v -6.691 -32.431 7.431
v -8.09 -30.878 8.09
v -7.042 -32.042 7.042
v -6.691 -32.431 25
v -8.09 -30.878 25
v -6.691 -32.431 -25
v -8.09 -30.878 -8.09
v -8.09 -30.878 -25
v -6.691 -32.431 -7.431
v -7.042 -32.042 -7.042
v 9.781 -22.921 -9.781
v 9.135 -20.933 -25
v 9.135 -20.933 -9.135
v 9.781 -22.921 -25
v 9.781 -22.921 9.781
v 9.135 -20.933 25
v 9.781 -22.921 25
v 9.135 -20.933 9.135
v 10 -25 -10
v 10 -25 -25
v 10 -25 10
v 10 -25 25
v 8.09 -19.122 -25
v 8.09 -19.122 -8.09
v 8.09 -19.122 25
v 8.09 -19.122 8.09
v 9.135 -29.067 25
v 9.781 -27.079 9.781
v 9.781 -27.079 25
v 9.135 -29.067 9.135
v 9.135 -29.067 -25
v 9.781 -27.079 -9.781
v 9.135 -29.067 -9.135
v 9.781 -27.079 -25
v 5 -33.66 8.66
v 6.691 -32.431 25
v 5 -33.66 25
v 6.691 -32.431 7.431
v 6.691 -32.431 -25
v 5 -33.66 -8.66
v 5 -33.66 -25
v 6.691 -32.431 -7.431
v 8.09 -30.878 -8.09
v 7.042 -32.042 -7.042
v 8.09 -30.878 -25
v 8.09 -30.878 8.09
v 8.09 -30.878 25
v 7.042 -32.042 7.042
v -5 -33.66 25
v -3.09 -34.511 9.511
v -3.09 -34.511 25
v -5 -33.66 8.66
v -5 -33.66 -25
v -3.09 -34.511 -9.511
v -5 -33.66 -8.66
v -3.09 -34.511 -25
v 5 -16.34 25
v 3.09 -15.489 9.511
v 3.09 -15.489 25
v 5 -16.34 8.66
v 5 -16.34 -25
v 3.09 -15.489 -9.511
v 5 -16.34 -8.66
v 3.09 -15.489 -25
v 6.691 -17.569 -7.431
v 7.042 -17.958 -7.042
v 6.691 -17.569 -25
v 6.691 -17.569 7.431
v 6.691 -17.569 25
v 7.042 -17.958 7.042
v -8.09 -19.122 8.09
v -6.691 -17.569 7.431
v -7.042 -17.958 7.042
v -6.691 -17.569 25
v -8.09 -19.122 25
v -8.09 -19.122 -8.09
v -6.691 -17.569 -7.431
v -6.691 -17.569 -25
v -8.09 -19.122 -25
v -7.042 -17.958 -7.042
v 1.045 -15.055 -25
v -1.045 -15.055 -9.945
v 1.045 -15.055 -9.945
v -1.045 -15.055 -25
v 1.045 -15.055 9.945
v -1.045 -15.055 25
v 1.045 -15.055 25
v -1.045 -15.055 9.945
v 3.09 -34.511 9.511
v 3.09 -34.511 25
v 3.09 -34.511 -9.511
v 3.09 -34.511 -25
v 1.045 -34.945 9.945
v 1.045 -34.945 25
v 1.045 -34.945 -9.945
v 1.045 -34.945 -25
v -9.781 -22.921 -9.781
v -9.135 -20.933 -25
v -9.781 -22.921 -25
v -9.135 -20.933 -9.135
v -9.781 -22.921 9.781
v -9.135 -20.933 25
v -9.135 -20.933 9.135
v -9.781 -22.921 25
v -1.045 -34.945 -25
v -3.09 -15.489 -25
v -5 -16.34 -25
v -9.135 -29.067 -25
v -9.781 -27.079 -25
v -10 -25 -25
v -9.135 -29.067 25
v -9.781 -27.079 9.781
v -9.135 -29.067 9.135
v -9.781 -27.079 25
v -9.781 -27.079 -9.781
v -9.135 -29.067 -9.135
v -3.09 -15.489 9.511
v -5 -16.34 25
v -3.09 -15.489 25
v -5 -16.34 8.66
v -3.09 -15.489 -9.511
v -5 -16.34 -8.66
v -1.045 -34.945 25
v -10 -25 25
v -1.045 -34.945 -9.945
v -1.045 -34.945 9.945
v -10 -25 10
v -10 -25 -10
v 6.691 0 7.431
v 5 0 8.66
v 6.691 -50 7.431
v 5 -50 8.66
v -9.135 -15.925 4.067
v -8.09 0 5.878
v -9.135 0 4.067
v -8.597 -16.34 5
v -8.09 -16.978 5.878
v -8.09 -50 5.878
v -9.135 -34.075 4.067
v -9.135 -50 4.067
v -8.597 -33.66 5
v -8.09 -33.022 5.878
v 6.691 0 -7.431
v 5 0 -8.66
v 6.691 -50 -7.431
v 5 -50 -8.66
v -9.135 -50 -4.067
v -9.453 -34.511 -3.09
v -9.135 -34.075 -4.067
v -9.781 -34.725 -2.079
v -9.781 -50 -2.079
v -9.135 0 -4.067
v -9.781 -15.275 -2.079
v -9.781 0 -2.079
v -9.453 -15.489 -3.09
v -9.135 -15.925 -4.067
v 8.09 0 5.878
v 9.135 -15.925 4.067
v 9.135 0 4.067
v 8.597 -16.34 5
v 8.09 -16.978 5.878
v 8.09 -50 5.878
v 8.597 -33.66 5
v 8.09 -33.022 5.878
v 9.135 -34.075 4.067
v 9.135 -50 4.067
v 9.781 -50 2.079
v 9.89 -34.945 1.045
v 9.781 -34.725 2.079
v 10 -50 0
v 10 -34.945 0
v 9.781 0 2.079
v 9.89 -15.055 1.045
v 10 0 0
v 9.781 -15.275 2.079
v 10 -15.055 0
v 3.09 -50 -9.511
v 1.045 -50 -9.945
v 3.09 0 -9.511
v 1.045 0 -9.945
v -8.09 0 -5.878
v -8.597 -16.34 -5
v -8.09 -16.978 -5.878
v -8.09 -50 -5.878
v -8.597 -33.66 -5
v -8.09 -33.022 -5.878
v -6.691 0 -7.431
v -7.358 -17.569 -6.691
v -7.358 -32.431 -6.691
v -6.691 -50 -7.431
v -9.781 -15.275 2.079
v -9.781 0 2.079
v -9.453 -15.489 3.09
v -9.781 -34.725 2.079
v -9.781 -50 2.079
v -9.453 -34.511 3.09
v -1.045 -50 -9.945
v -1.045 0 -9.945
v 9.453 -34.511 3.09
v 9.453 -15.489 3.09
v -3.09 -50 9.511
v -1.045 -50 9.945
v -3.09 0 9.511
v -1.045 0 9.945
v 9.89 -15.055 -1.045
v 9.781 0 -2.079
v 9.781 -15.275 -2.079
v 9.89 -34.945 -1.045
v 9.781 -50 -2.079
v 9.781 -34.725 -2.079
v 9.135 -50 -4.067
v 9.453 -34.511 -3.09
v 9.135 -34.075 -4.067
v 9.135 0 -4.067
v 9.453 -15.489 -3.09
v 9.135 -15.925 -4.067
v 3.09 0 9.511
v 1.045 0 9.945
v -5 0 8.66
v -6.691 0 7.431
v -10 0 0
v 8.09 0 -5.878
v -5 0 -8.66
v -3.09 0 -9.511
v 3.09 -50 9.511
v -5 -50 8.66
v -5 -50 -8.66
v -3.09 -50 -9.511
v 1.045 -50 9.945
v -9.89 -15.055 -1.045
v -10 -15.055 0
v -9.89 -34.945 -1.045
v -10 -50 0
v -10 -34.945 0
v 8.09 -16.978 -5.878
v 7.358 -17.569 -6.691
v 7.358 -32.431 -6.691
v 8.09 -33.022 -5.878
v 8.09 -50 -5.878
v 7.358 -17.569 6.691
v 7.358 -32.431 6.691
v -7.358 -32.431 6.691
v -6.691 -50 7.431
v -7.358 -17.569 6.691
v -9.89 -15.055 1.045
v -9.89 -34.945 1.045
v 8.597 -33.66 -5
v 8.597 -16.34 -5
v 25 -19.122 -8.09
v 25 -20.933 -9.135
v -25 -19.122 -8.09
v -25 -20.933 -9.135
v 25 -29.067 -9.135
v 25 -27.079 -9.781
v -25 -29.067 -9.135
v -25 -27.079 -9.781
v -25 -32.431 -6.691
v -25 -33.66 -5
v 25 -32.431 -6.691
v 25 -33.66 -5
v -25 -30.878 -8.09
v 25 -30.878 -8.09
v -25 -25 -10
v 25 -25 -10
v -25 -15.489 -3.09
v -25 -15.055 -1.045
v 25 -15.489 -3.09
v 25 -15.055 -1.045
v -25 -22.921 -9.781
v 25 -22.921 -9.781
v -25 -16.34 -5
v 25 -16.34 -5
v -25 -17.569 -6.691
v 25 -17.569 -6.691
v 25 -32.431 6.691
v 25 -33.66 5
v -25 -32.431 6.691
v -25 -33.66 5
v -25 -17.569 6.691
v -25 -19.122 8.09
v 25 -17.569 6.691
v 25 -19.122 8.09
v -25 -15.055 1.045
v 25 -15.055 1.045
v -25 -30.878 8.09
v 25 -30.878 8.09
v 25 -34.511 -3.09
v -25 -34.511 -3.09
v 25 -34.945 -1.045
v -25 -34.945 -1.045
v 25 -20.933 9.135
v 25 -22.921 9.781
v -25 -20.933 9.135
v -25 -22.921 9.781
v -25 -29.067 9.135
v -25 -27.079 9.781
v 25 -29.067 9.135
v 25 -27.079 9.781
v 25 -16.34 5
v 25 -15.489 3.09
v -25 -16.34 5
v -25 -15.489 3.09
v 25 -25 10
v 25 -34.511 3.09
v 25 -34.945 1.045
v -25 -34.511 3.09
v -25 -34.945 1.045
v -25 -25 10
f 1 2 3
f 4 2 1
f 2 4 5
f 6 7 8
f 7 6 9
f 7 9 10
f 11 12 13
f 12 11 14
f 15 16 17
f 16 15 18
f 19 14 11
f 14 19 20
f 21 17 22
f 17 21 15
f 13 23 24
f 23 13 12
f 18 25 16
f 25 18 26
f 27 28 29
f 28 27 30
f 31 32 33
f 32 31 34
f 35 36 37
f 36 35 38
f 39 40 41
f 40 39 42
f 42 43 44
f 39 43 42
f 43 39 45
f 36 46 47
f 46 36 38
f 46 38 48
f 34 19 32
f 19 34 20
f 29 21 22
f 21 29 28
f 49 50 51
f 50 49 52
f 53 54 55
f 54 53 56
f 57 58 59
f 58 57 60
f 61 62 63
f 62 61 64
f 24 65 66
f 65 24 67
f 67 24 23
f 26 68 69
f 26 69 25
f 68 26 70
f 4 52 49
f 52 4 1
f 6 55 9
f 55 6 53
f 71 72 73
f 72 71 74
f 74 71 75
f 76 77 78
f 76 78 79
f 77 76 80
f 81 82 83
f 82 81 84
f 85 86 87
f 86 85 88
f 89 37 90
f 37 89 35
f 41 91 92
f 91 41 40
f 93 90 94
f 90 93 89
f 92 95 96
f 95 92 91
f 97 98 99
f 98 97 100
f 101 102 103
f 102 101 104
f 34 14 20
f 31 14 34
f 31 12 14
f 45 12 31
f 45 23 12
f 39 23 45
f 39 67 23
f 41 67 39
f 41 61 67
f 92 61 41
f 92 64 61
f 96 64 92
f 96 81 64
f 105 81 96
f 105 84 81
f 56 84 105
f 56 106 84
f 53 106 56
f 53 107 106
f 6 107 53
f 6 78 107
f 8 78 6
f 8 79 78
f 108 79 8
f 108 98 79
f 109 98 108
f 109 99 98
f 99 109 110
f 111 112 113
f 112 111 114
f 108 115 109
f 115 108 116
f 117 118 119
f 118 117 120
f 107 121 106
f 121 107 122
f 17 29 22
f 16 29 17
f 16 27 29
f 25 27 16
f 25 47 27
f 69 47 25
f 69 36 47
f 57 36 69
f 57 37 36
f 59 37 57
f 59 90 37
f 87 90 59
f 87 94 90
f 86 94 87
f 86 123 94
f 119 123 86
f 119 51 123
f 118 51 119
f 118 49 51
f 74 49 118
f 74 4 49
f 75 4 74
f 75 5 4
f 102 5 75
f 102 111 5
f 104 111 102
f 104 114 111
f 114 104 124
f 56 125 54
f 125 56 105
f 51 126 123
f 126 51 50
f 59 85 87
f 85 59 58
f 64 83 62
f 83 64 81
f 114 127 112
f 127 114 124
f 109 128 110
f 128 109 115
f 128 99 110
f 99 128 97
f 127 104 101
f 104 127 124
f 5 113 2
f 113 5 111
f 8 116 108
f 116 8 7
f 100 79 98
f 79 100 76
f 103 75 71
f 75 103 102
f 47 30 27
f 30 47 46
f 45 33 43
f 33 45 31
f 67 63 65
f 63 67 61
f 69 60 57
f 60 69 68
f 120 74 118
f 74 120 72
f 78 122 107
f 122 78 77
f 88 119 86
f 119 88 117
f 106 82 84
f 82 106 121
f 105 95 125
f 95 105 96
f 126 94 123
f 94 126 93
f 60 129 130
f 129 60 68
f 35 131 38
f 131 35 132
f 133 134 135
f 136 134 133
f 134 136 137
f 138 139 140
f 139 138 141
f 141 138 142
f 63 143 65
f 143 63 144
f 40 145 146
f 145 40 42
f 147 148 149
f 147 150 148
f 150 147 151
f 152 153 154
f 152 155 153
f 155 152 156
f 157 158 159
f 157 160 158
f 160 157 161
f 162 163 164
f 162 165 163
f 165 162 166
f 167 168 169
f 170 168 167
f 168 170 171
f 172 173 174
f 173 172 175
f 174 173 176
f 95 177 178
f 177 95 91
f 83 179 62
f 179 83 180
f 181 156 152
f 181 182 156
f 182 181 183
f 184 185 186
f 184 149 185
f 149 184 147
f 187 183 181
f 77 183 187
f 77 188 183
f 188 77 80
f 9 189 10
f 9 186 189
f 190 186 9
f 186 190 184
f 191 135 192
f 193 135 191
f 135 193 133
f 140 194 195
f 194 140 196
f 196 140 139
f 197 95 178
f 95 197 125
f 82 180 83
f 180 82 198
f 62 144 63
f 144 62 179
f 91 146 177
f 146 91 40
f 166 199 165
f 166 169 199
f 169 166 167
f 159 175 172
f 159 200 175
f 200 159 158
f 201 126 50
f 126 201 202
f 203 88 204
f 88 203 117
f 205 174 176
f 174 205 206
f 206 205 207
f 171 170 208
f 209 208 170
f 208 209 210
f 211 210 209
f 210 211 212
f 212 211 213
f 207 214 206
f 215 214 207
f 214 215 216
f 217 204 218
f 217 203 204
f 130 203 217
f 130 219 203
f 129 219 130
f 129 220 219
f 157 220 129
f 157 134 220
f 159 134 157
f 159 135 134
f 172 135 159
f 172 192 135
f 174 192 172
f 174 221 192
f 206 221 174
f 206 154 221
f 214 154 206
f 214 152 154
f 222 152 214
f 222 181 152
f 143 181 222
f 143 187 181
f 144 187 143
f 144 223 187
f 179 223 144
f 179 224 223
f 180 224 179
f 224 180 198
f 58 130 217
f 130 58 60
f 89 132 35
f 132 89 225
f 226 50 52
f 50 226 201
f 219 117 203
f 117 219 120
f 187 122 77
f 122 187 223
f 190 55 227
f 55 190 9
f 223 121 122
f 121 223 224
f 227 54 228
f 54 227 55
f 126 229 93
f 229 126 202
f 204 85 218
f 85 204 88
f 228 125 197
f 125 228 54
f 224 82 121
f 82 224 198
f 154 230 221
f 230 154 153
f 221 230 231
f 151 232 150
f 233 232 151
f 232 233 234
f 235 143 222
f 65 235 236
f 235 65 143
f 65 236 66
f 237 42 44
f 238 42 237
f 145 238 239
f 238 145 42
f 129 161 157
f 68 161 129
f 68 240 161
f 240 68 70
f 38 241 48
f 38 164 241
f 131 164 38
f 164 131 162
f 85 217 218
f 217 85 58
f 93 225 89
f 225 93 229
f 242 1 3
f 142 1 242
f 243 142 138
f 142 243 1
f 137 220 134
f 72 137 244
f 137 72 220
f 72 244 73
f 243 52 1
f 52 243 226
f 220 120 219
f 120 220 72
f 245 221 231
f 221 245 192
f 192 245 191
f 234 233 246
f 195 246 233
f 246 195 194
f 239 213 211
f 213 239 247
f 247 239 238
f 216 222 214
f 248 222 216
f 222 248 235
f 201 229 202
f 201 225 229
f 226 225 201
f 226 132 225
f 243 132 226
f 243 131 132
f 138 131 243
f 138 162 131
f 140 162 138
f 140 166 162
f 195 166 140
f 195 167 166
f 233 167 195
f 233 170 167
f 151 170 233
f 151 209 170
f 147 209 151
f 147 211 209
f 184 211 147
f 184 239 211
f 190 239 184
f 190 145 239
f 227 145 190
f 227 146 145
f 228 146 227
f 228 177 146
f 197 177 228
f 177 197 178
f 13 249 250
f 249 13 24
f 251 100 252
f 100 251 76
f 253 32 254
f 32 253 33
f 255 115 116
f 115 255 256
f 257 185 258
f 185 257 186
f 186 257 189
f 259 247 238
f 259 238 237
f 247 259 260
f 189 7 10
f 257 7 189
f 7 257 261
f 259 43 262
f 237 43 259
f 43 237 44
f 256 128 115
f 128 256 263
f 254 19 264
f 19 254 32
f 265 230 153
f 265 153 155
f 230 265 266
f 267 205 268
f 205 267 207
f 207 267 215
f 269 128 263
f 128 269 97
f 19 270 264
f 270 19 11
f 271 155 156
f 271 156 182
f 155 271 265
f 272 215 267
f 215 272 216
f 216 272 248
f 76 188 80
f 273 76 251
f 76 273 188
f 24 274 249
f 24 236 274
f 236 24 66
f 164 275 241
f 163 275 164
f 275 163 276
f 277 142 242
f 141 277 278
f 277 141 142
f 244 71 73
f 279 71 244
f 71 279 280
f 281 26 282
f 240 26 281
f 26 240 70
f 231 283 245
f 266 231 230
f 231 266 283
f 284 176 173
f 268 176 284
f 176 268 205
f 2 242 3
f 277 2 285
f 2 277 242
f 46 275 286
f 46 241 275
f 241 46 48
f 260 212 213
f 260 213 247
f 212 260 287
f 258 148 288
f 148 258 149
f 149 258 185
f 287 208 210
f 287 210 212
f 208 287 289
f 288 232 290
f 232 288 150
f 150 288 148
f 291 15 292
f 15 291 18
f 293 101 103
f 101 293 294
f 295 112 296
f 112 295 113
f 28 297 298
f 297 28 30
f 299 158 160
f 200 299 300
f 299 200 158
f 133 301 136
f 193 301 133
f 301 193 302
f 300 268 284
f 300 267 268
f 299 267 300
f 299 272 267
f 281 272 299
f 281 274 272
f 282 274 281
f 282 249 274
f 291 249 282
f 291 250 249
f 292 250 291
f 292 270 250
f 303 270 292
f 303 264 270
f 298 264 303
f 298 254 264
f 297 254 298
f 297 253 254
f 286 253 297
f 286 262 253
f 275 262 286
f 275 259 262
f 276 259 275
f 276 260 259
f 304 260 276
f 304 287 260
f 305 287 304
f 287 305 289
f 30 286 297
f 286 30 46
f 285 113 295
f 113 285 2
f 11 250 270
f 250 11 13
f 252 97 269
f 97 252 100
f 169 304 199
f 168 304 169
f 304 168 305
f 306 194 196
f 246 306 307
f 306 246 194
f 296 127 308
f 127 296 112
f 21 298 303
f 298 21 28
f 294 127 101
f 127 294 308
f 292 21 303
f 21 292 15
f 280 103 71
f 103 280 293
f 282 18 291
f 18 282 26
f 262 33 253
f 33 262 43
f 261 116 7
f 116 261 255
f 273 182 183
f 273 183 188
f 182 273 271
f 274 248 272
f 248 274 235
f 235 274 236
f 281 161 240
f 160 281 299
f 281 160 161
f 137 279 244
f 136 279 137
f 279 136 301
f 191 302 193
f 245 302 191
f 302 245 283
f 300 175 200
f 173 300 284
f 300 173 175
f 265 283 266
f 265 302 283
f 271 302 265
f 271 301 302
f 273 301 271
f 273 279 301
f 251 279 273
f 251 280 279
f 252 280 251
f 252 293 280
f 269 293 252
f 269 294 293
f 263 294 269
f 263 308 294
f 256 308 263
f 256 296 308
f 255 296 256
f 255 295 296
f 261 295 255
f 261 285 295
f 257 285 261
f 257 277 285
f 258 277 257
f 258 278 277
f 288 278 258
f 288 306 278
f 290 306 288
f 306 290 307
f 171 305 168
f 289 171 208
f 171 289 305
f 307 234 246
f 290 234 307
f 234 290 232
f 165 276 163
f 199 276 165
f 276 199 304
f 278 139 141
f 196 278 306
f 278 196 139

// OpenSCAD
module base_cylinder() {
  cylinder(50, 10, 10);
}

union() {
  translate([0, -25, -25])
  base_cylinder();

  rotate([90, 0, 0])
  cylinder(50, 10, 10);

  translate([-25, -25, 0])
  rotate([0, 90, 0])
  cylinder(50, 10, 10);
}
